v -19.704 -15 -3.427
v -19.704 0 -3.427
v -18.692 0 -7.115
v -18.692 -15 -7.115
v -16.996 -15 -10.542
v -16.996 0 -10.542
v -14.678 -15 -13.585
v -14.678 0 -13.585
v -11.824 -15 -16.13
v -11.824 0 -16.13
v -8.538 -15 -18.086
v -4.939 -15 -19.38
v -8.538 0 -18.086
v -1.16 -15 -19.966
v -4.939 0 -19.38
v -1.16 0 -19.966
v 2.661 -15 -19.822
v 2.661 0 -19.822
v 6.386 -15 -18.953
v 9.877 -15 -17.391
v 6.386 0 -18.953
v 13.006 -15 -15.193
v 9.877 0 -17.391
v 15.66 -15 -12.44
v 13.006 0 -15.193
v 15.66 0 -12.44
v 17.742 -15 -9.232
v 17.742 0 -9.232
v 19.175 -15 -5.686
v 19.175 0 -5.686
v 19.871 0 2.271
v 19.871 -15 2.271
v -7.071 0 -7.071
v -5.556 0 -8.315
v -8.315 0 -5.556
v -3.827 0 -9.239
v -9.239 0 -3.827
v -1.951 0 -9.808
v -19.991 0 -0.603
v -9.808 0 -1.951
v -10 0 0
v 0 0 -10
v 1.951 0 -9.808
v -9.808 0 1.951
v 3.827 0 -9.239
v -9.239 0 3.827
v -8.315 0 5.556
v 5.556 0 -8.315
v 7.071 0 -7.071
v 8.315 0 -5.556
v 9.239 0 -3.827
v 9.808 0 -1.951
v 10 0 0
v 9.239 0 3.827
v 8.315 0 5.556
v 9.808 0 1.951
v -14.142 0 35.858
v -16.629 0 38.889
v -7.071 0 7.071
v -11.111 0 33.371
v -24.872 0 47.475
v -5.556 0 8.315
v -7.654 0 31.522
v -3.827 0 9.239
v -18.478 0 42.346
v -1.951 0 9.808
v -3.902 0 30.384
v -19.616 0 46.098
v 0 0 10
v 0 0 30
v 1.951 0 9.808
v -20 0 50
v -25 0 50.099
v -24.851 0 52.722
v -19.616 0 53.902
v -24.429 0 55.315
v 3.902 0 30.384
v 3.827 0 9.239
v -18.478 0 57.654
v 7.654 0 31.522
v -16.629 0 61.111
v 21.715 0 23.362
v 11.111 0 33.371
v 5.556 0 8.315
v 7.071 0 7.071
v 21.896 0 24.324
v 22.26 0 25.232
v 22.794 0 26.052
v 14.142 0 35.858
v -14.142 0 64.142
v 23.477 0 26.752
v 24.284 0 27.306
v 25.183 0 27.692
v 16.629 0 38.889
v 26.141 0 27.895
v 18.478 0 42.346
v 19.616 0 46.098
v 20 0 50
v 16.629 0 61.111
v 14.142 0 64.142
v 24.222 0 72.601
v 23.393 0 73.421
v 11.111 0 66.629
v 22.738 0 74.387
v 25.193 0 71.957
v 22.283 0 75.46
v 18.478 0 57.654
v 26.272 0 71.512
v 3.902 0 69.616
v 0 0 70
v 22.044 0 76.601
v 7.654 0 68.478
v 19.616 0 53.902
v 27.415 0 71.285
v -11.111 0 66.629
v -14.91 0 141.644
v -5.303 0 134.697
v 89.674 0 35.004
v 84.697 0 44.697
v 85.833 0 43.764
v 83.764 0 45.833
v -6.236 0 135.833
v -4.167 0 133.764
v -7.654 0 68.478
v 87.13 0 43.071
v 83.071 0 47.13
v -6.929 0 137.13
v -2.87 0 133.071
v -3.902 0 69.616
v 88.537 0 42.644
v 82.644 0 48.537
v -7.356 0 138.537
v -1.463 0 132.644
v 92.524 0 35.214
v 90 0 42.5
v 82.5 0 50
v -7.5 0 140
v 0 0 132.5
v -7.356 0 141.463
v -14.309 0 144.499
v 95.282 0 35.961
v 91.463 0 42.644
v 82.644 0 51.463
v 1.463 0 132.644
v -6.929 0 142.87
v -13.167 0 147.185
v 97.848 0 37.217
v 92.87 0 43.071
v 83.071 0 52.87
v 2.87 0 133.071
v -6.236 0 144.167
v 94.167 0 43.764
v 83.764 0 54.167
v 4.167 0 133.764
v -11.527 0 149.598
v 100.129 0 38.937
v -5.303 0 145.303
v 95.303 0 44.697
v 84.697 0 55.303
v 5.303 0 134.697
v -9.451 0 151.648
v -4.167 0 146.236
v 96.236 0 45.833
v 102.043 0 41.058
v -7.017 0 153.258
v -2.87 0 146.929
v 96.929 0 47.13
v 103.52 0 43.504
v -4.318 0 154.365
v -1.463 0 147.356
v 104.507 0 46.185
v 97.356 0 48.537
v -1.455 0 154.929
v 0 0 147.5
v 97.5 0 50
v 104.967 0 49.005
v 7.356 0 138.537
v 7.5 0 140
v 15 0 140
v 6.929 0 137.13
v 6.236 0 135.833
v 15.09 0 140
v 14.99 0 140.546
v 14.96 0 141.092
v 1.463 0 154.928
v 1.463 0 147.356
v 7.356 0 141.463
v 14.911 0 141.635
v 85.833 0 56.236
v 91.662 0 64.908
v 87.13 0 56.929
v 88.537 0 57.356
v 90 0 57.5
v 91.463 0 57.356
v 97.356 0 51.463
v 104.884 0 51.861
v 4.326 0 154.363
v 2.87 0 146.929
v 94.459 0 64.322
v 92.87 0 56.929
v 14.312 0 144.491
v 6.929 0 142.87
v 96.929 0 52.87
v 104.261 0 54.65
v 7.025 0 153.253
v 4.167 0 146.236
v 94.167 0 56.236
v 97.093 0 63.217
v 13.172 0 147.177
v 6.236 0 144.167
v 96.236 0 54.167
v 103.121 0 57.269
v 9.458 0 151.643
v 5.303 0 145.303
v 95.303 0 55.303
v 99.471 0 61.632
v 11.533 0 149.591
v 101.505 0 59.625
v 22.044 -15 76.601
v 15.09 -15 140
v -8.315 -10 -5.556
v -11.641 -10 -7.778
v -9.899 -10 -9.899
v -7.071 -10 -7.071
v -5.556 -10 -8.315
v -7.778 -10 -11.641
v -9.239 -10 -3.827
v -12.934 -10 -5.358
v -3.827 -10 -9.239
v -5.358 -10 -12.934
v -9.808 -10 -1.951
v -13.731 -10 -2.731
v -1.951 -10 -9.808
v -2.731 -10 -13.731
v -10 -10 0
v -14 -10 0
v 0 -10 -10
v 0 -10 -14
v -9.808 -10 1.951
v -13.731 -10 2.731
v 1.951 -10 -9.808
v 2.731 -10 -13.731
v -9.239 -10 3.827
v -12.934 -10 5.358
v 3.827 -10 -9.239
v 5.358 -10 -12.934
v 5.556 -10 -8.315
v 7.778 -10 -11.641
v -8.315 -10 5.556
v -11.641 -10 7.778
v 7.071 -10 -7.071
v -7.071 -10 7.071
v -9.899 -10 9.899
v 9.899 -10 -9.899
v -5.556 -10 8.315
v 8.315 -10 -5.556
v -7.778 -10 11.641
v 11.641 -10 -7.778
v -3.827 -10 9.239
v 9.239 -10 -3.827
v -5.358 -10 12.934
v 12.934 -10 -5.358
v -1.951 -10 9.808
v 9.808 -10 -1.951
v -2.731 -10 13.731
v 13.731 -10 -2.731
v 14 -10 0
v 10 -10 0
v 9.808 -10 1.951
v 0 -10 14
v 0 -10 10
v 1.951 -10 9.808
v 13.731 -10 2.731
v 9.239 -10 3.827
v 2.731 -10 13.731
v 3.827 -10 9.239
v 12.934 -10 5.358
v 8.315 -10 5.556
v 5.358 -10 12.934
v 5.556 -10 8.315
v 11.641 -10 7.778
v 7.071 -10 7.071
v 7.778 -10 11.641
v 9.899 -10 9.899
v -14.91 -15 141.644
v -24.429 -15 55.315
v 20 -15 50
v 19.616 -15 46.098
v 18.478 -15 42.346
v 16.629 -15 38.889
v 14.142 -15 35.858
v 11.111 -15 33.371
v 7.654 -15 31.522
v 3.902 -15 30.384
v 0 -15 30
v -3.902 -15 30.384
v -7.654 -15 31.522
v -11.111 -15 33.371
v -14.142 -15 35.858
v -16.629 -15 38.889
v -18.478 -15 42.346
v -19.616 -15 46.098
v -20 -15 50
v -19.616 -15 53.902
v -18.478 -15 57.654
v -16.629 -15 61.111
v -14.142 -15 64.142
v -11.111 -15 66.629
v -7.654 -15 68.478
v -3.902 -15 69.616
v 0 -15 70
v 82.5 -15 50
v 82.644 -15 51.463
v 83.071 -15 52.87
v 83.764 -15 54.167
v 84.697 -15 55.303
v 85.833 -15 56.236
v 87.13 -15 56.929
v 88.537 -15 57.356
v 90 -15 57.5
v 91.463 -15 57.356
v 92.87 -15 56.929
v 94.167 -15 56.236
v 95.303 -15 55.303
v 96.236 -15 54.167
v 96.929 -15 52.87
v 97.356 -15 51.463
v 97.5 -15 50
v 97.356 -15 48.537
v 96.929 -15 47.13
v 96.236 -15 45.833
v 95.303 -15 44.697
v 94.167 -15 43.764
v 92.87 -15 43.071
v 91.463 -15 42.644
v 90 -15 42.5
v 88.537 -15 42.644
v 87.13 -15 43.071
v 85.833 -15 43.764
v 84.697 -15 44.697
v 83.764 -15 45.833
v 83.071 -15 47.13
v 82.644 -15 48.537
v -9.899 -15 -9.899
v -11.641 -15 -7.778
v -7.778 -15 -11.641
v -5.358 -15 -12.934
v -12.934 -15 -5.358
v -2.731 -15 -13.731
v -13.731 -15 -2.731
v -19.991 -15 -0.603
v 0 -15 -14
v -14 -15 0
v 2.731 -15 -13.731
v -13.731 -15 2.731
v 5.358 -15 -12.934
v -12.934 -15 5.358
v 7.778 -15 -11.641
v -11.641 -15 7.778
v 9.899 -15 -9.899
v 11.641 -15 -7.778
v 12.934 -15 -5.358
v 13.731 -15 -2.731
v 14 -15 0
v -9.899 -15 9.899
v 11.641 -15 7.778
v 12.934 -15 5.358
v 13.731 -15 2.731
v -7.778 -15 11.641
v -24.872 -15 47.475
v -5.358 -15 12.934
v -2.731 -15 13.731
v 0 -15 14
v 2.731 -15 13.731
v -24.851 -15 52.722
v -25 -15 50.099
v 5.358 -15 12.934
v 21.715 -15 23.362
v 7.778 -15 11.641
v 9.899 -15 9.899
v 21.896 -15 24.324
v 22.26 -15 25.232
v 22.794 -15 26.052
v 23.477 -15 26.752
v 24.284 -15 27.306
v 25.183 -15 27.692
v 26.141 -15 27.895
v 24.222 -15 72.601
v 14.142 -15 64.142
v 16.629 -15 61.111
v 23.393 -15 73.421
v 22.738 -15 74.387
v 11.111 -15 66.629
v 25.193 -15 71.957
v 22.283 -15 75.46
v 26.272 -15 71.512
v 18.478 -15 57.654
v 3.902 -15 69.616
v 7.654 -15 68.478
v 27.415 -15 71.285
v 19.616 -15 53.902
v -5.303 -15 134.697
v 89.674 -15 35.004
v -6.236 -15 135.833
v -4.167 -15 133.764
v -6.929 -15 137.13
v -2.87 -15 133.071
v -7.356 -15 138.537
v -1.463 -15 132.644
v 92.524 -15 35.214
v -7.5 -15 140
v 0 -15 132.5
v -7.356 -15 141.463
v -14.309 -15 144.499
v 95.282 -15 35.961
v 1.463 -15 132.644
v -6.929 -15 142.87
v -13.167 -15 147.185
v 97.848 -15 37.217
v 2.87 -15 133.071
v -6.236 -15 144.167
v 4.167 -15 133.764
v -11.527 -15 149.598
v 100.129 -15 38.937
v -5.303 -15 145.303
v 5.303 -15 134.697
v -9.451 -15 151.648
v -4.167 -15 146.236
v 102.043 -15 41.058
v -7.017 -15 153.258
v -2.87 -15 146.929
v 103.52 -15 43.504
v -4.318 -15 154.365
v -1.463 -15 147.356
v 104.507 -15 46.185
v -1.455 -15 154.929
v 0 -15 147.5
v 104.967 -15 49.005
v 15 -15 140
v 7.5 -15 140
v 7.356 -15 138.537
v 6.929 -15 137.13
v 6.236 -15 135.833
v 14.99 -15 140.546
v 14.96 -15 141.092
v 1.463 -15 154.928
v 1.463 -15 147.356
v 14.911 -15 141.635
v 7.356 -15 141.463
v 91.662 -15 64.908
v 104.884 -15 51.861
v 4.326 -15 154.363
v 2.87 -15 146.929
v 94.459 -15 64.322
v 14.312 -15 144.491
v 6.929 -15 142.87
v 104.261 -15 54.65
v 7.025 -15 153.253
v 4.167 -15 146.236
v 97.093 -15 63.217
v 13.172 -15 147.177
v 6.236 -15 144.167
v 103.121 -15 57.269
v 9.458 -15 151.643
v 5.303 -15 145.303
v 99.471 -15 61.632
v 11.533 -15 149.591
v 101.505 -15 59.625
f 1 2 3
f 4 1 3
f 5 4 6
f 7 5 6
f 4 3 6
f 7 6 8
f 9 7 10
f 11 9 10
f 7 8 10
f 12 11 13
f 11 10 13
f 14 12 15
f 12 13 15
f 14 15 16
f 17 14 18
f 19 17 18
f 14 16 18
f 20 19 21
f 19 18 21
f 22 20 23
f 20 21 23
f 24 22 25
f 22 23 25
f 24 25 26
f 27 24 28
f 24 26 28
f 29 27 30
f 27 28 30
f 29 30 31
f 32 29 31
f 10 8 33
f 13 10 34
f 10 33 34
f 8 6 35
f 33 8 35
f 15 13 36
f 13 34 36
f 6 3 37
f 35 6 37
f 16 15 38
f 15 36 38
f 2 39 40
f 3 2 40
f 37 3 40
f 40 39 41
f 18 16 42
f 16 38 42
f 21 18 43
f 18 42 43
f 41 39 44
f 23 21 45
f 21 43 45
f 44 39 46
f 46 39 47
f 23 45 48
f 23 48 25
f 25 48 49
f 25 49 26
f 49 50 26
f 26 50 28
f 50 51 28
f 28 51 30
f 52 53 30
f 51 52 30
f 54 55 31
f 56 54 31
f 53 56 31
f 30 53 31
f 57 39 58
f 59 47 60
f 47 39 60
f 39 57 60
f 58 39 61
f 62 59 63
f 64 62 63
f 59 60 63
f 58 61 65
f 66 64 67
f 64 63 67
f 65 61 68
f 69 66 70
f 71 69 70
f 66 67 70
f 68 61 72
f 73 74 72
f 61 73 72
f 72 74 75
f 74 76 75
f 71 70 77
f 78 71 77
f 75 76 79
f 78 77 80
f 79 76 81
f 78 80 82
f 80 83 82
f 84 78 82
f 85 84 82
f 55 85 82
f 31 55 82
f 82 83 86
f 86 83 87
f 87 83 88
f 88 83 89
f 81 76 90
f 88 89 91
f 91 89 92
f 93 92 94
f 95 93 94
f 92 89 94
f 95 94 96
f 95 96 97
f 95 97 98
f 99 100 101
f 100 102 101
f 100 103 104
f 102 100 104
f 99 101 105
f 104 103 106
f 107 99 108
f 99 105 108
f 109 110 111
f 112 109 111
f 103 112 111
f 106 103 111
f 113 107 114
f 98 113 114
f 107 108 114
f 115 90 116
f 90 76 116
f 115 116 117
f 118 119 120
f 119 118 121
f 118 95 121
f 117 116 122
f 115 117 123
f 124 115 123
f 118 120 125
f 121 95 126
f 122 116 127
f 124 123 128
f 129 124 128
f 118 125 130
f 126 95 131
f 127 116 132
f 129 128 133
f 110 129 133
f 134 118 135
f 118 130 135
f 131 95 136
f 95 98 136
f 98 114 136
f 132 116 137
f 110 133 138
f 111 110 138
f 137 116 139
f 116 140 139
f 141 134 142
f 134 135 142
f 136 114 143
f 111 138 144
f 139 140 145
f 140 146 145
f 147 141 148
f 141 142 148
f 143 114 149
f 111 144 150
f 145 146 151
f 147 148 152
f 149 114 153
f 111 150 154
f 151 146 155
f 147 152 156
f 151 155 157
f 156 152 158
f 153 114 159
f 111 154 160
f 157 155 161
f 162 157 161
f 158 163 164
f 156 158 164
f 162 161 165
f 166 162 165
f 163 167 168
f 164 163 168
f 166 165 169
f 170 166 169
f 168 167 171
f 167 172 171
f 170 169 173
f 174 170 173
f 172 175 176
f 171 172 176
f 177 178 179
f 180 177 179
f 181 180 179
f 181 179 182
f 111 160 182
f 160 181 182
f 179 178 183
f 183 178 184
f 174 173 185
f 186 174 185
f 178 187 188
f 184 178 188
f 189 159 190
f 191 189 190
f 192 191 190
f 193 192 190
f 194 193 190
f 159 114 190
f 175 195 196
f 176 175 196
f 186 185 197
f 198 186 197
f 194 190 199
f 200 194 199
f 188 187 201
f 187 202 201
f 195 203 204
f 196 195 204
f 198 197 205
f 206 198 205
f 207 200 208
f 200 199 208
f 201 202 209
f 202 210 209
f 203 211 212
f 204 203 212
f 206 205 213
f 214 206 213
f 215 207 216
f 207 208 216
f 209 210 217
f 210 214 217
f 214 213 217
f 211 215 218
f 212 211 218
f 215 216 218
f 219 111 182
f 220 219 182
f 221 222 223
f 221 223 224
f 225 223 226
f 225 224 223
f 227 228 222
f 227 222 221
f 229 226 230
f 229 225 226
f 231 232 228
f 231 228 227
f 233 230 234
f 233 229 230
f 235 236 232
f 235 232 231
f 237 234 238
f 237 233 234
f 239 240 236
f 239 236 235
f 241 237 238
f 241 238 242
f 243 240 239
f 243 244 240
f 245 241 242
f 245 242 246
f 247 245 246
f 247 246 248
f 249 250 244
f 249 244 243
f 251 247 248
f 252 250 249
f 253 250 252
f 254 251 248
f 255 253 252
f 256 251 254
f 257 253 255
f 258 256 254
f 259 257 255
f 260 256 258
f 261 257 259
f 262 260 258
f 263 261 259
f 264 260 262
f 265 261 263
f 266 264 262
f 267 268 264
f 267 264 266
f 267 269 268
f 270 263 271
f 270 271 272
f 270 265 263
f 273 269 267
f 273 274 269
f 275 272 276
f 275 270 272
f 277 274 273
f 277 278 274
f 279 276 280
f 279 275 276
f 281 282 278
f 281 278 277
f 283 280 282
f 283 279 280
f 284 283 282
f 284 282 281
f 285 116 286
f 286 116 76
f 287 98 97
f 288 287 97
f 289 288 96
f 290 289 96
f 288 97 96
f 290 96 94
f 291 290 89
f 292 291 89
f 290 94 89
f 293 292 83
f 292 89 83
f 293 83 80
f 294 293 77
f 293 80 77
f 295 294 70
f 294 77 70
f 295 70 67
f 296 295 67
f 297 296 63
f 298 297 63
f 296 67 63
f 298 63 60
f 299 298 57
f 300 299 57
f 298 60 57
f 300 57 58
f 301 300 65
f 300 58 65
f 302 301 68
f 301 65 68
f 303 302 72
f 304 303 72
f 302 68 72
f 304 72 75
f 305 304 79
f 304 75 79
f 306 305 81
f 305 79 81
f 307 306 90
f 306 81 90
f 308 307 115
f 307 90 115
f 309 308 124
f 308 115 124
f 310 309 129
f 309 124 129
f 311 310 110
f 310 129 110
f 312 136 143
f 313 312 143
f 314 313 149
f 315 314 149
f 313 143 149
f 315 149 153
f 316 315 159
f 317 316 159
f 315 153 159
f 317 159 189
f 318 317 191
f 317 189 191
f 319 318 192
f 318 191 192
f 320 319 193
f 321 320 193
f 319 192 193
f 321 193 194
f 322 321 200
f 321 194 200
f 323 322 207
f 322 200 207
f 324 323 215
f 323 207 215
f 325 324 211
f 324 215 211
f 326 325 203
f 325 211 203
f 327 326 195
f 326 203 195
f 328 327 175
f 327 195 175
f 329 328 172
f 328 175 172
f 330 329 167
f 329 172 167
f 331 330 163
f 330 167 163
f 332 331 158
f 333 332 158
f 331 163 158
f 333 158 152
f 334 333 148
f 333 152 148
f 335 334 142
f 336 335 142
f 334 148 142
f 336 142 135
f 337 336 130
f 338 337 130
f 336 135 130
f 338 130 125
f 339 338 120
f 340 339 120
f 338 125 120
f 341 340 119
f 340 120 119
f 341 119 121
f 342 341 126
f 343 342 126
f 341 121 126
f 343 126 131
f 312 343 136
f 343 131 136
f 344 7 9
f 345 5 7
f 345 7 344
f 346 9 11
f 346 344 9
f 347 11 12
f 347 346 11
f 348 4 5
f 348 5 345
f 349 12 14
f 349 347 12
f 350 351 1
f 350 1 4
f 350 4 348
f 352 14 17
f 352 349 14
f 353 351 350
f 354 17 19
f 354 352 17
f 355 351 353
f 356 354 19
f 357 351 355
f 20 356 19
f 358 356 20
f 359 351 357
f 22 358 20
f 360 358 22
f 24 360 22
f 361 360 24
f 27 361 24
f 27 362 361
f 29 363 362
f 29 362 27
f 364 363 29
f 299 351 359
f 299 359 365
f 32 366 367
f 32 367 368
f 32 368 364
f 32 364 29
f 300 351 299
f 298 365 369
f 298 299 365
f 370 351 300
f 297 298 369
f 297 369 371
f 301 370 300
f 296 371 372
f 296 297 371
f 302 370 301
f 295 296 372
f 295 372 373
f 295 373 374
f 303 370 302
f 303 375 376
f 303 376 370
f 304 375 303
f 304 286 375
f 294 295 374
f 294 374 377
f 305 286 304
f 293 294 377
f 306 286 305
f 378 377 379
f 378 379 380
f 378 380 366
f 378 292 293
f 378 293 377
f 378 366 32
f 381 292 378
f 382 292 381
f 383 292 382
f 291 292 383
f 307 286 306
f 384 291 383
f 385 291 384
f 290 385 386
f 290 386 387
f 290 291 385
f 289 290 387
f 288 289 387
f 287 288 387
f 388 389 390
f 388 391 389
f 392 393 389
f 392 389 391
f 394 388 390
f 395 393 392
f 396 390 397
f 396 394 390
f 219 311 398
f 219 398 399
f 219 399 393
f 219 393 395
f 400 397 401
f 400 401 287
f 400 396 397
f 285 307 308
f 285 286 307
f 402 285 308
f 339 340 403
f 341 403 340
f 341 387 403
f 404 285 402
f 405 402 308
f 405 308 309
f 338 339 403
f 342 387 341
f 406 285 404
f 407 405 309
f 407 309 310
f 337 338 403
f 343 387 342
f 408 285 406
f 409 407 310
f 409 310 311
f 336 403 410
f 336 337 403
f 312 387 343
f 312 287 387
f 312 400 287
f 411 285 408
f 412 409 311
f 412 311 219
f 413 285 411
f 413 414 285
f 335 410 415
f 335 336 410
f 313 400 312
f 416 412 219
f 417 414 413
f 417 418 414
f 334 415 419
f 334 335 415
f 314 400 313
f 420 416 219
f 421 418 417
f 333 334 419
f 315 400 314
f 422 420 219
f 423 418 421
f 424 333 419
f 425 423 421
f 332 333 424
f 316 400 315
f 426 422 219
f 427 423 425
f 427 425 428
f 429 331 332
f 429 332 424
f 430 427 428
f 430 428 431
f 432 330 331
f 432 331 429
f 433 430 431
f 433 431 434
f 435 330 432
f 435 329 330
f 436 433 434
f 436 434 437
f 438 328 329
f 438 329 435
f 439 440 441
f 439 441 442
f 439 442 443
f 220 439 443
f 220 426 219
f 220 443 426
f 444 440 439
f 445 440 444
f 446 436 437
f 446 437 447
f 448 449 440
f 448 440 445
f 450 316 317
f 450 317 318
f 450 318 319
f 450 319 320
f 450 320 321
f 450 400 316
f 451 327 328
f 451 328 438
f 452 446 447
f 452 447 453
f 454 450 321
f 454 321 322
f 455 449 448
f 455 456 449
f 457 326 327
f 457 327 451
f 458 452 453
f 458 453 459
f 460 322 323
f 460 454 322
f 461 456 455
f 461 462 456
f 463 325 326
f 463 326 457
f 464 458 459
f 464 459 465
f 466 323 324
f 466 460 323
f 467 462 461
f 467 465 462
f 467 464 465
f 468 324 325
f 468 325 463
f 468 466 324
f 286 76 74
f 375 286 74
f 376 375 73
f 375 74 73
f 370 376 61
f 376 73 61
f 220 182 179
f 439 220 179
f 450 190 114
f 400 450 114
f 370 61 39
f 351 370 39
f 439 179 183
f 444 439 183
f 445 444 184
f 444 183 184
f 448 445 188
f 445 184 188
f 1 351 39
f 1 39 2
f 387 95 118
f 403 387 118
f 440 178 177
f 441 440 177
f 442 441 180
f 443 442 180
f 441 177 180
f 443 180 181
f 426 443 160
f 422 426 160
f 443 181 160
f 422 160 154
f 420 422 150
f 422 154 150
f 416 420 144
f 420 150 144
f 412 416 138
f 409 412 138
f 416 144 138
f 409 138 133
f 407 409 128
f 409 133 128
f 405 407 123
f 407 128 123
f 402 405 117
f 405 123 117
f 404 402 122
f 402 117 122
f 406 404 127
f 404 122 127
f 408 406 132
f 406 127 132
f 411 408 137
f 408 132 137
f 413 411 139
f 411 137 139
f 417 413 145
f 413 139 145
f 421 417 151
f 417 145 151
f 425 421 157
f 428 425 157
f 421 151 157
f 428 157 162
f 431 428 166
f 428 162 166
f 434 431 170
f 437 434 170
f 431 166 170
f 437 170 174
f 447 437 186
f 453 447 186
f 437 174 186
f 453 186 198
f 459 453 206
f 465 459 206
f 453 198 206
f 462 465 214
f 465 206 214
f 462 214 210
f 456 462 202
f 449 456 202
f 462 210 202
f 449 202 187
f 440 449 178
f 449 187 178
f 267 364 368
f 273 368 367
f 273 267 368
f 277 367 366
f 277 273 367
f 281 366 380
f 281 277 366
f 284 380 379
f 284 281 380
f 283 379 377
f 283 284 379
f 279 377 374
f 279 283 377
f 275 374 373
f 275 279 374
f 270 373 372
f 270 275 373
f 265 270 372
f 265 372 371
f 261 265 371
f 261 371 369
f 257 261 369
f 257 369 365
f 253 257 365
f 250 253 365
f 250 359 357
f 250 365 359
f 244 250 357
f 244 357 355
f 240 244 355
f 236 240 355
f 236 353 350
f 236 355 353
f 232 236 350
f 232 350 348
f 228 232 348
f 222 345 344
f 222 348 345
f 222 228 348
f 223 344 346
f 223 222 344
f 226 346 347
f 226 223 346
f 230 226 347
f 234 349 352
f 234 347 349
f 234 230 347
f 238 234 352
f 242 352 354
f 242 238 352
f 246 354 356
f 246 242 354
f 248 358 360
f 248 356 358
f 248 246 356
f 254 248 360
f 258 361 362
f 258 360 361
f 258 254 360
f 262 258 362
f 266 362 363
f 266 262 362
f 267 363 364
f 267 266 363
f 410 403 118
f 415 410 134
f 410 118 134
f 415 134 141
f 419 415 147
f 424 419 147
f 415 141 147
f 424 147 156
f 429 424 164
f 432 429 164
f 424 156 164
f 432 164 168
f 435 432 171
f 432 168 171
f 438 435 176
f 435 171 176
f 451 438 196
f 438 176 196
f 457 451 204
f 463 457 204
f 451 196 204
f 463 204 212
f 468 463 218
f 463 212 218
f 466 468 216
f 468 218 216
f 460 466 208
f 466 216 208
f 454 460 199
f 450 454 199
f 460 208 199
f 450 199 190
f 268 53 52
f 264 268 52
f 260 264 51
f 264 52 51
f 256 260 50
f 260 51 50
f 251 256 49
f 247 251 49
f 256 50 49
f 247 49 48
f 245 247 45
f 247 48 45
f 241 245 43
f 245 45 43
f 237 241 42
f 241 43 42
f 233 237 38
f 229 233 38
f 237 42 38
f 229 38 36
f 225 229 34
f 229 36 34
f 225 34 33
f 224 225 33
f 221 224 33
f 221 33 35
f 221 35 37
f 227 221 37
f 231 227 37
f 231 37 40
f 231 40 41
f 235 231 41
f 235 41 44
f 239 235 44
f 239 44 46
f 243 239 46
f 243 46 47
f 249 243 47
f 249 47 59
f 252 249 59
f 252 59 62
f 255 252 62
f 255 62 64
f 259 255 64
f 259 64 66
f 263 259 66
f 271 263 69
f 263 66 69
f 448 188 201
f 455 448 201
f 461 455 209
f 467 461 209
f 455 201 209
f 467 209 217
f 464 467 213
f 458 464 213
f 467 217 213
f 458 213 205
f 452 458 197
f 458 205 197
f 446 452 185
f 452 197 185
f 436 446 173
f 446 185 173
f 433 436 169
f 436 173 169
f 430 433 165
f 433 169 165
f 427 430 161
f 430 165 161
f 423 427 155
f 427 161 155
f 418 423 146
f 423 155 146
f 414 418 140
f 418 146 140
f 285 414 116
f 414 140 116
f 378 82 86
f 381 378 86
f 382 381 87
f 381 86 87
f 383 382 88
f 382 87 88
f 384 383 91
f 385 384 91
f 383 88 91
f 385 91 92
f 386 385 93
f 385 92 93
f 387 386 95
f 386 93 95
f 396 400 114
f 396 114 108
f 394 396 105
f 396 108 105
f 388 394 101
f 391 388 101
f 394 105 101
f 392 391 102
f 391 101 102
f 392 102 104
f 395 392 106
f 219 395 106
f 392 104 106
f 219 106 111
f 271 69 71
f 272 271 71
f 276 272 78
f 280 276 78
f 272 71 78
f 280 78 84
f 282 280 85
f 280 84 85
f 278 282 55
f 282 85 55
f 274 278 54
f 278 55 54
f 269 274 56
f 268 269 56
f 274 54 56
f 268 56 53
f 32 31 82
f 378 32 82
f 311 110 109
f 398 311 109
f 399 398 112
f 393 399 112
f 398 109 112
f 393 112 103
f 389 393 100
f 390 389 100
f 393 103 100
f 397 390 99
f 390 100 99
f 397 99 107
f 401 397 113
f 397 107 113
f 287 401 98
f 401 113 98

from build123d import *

# Parameters (mm, degrees)
F1_DEPTH = 15
F3_START = 10
F2_R     = 14
F3_DEPTH = 15


with BuildPart() as f1:
    # F0 (on Front) → F1 (new body)
    with BuildSketch(Plane.XZ):
        with BuildLine():
            Line((-24.8721406347, 47.4748029292), (-19.9908943662, -0.603442158))
            Line((-19.9908943662, -0.603442158), (-19.7042578352, -3.4266927442))
            ThreePointArc((-19.7042578352, -3.4266927442), (-1.1601406694, -19.966323488), (19.1747802681, -5.6857542744))
            Line((19.1747802681, -5.6857542744), (19.8706965994, 2.2705542616))
            Line((19.8706965994, 2.2705542616), (21.7154896457, 23.361800439))
            ThreePointArc((21.7154896457, 23.361800439), (23.1184617772, 26.4186682546), (26.1405225938, 27.895123491))
            Line((26.1405225938, 27.895123491), (89.6744252597, 35.0035337133))
            ThreePointArc((89.6744252597, 35.0035337133), (104.9669737345, 49.0051647211), (91.6621115435, 64.9076284236))
            Line((91.6621115435, 64.9076284236), (27.4153419388, 71.2848644166))
            ThreePointArc((27.4153419388, 71.2848644166), (23.7872845646, 72.9910681825), (22.0437681238, 76.6013426904))
            Line((22.0437681238, 76.6013426904), (15.089959345, 140))
            Line((15.089959345, 140), (15, 140))
            ThreePointArc((15, 140), (14.9776275535, 140.8189461935), (14.910576951, 141.6354494764))
            ThreePointArc((14.910576951, 141.6354494764), (0.0042894025, 154.9999993867), (-14.9096391656, 141.6439768707))
            Line((-14.9096391656, 141.6439768707), (-24.4285254093, 55.3148066248))
            ThreePointArc((-24.4285254093, 55.3148066248), (-24.960074773, 51.4123310642), (-24.8721406347, 47.4748029292))
        make_face()
        with BuildLine():
            ThreePointArc((10, 0), (-7.0710678119, -7.0710678119), (0, 10))
            ThreePointArc((0, 10), (7.0710678119, 7.0710678119), (10, 0))
        make_face(mode=Mode.SUBTRACT)
        with BuildLine():
            ThreePointArc((0, 30), (-20, 50), (0, 70))
            ThreePointArc((0, 70), (14.1421356237, 64.1421356237), (20, 50))
            ThreePointArc((20, 50), (14.1421356237, 35.8578643763), (0, 30))
        make_face(mode=Mode.SUBTRACT)
        with BuildLine():
            ThreePointArc((97.5, 50), (90, 42.5), (82.5, 50))
            ThreePointArc((82.5, 50), (90, 57.5), (97.5, 50))
        make_face(mode=Mode.SUBTRACT)
        with BuildLine():
            ThreePointArc((0, 132.5), (-5.3033008589, 145.3033008589), (7.5, 140))
            ThreePointArc((7.5, 140), (5.3033008589, 134.6966991411), (0, 132.5))
        make_face(mode=Mode.SUBTRACT)
    extrude(amount=F1_DEPTH)

    # F2 (on Front) → F3 (cut)
    with BuildSketch(Plane.XZ.offset(F3_START)):
        Circle(F2_R)
    extrude(amount=F3_DEPTH, mode=Mode.SUBTRACT)


solid = f1.part
